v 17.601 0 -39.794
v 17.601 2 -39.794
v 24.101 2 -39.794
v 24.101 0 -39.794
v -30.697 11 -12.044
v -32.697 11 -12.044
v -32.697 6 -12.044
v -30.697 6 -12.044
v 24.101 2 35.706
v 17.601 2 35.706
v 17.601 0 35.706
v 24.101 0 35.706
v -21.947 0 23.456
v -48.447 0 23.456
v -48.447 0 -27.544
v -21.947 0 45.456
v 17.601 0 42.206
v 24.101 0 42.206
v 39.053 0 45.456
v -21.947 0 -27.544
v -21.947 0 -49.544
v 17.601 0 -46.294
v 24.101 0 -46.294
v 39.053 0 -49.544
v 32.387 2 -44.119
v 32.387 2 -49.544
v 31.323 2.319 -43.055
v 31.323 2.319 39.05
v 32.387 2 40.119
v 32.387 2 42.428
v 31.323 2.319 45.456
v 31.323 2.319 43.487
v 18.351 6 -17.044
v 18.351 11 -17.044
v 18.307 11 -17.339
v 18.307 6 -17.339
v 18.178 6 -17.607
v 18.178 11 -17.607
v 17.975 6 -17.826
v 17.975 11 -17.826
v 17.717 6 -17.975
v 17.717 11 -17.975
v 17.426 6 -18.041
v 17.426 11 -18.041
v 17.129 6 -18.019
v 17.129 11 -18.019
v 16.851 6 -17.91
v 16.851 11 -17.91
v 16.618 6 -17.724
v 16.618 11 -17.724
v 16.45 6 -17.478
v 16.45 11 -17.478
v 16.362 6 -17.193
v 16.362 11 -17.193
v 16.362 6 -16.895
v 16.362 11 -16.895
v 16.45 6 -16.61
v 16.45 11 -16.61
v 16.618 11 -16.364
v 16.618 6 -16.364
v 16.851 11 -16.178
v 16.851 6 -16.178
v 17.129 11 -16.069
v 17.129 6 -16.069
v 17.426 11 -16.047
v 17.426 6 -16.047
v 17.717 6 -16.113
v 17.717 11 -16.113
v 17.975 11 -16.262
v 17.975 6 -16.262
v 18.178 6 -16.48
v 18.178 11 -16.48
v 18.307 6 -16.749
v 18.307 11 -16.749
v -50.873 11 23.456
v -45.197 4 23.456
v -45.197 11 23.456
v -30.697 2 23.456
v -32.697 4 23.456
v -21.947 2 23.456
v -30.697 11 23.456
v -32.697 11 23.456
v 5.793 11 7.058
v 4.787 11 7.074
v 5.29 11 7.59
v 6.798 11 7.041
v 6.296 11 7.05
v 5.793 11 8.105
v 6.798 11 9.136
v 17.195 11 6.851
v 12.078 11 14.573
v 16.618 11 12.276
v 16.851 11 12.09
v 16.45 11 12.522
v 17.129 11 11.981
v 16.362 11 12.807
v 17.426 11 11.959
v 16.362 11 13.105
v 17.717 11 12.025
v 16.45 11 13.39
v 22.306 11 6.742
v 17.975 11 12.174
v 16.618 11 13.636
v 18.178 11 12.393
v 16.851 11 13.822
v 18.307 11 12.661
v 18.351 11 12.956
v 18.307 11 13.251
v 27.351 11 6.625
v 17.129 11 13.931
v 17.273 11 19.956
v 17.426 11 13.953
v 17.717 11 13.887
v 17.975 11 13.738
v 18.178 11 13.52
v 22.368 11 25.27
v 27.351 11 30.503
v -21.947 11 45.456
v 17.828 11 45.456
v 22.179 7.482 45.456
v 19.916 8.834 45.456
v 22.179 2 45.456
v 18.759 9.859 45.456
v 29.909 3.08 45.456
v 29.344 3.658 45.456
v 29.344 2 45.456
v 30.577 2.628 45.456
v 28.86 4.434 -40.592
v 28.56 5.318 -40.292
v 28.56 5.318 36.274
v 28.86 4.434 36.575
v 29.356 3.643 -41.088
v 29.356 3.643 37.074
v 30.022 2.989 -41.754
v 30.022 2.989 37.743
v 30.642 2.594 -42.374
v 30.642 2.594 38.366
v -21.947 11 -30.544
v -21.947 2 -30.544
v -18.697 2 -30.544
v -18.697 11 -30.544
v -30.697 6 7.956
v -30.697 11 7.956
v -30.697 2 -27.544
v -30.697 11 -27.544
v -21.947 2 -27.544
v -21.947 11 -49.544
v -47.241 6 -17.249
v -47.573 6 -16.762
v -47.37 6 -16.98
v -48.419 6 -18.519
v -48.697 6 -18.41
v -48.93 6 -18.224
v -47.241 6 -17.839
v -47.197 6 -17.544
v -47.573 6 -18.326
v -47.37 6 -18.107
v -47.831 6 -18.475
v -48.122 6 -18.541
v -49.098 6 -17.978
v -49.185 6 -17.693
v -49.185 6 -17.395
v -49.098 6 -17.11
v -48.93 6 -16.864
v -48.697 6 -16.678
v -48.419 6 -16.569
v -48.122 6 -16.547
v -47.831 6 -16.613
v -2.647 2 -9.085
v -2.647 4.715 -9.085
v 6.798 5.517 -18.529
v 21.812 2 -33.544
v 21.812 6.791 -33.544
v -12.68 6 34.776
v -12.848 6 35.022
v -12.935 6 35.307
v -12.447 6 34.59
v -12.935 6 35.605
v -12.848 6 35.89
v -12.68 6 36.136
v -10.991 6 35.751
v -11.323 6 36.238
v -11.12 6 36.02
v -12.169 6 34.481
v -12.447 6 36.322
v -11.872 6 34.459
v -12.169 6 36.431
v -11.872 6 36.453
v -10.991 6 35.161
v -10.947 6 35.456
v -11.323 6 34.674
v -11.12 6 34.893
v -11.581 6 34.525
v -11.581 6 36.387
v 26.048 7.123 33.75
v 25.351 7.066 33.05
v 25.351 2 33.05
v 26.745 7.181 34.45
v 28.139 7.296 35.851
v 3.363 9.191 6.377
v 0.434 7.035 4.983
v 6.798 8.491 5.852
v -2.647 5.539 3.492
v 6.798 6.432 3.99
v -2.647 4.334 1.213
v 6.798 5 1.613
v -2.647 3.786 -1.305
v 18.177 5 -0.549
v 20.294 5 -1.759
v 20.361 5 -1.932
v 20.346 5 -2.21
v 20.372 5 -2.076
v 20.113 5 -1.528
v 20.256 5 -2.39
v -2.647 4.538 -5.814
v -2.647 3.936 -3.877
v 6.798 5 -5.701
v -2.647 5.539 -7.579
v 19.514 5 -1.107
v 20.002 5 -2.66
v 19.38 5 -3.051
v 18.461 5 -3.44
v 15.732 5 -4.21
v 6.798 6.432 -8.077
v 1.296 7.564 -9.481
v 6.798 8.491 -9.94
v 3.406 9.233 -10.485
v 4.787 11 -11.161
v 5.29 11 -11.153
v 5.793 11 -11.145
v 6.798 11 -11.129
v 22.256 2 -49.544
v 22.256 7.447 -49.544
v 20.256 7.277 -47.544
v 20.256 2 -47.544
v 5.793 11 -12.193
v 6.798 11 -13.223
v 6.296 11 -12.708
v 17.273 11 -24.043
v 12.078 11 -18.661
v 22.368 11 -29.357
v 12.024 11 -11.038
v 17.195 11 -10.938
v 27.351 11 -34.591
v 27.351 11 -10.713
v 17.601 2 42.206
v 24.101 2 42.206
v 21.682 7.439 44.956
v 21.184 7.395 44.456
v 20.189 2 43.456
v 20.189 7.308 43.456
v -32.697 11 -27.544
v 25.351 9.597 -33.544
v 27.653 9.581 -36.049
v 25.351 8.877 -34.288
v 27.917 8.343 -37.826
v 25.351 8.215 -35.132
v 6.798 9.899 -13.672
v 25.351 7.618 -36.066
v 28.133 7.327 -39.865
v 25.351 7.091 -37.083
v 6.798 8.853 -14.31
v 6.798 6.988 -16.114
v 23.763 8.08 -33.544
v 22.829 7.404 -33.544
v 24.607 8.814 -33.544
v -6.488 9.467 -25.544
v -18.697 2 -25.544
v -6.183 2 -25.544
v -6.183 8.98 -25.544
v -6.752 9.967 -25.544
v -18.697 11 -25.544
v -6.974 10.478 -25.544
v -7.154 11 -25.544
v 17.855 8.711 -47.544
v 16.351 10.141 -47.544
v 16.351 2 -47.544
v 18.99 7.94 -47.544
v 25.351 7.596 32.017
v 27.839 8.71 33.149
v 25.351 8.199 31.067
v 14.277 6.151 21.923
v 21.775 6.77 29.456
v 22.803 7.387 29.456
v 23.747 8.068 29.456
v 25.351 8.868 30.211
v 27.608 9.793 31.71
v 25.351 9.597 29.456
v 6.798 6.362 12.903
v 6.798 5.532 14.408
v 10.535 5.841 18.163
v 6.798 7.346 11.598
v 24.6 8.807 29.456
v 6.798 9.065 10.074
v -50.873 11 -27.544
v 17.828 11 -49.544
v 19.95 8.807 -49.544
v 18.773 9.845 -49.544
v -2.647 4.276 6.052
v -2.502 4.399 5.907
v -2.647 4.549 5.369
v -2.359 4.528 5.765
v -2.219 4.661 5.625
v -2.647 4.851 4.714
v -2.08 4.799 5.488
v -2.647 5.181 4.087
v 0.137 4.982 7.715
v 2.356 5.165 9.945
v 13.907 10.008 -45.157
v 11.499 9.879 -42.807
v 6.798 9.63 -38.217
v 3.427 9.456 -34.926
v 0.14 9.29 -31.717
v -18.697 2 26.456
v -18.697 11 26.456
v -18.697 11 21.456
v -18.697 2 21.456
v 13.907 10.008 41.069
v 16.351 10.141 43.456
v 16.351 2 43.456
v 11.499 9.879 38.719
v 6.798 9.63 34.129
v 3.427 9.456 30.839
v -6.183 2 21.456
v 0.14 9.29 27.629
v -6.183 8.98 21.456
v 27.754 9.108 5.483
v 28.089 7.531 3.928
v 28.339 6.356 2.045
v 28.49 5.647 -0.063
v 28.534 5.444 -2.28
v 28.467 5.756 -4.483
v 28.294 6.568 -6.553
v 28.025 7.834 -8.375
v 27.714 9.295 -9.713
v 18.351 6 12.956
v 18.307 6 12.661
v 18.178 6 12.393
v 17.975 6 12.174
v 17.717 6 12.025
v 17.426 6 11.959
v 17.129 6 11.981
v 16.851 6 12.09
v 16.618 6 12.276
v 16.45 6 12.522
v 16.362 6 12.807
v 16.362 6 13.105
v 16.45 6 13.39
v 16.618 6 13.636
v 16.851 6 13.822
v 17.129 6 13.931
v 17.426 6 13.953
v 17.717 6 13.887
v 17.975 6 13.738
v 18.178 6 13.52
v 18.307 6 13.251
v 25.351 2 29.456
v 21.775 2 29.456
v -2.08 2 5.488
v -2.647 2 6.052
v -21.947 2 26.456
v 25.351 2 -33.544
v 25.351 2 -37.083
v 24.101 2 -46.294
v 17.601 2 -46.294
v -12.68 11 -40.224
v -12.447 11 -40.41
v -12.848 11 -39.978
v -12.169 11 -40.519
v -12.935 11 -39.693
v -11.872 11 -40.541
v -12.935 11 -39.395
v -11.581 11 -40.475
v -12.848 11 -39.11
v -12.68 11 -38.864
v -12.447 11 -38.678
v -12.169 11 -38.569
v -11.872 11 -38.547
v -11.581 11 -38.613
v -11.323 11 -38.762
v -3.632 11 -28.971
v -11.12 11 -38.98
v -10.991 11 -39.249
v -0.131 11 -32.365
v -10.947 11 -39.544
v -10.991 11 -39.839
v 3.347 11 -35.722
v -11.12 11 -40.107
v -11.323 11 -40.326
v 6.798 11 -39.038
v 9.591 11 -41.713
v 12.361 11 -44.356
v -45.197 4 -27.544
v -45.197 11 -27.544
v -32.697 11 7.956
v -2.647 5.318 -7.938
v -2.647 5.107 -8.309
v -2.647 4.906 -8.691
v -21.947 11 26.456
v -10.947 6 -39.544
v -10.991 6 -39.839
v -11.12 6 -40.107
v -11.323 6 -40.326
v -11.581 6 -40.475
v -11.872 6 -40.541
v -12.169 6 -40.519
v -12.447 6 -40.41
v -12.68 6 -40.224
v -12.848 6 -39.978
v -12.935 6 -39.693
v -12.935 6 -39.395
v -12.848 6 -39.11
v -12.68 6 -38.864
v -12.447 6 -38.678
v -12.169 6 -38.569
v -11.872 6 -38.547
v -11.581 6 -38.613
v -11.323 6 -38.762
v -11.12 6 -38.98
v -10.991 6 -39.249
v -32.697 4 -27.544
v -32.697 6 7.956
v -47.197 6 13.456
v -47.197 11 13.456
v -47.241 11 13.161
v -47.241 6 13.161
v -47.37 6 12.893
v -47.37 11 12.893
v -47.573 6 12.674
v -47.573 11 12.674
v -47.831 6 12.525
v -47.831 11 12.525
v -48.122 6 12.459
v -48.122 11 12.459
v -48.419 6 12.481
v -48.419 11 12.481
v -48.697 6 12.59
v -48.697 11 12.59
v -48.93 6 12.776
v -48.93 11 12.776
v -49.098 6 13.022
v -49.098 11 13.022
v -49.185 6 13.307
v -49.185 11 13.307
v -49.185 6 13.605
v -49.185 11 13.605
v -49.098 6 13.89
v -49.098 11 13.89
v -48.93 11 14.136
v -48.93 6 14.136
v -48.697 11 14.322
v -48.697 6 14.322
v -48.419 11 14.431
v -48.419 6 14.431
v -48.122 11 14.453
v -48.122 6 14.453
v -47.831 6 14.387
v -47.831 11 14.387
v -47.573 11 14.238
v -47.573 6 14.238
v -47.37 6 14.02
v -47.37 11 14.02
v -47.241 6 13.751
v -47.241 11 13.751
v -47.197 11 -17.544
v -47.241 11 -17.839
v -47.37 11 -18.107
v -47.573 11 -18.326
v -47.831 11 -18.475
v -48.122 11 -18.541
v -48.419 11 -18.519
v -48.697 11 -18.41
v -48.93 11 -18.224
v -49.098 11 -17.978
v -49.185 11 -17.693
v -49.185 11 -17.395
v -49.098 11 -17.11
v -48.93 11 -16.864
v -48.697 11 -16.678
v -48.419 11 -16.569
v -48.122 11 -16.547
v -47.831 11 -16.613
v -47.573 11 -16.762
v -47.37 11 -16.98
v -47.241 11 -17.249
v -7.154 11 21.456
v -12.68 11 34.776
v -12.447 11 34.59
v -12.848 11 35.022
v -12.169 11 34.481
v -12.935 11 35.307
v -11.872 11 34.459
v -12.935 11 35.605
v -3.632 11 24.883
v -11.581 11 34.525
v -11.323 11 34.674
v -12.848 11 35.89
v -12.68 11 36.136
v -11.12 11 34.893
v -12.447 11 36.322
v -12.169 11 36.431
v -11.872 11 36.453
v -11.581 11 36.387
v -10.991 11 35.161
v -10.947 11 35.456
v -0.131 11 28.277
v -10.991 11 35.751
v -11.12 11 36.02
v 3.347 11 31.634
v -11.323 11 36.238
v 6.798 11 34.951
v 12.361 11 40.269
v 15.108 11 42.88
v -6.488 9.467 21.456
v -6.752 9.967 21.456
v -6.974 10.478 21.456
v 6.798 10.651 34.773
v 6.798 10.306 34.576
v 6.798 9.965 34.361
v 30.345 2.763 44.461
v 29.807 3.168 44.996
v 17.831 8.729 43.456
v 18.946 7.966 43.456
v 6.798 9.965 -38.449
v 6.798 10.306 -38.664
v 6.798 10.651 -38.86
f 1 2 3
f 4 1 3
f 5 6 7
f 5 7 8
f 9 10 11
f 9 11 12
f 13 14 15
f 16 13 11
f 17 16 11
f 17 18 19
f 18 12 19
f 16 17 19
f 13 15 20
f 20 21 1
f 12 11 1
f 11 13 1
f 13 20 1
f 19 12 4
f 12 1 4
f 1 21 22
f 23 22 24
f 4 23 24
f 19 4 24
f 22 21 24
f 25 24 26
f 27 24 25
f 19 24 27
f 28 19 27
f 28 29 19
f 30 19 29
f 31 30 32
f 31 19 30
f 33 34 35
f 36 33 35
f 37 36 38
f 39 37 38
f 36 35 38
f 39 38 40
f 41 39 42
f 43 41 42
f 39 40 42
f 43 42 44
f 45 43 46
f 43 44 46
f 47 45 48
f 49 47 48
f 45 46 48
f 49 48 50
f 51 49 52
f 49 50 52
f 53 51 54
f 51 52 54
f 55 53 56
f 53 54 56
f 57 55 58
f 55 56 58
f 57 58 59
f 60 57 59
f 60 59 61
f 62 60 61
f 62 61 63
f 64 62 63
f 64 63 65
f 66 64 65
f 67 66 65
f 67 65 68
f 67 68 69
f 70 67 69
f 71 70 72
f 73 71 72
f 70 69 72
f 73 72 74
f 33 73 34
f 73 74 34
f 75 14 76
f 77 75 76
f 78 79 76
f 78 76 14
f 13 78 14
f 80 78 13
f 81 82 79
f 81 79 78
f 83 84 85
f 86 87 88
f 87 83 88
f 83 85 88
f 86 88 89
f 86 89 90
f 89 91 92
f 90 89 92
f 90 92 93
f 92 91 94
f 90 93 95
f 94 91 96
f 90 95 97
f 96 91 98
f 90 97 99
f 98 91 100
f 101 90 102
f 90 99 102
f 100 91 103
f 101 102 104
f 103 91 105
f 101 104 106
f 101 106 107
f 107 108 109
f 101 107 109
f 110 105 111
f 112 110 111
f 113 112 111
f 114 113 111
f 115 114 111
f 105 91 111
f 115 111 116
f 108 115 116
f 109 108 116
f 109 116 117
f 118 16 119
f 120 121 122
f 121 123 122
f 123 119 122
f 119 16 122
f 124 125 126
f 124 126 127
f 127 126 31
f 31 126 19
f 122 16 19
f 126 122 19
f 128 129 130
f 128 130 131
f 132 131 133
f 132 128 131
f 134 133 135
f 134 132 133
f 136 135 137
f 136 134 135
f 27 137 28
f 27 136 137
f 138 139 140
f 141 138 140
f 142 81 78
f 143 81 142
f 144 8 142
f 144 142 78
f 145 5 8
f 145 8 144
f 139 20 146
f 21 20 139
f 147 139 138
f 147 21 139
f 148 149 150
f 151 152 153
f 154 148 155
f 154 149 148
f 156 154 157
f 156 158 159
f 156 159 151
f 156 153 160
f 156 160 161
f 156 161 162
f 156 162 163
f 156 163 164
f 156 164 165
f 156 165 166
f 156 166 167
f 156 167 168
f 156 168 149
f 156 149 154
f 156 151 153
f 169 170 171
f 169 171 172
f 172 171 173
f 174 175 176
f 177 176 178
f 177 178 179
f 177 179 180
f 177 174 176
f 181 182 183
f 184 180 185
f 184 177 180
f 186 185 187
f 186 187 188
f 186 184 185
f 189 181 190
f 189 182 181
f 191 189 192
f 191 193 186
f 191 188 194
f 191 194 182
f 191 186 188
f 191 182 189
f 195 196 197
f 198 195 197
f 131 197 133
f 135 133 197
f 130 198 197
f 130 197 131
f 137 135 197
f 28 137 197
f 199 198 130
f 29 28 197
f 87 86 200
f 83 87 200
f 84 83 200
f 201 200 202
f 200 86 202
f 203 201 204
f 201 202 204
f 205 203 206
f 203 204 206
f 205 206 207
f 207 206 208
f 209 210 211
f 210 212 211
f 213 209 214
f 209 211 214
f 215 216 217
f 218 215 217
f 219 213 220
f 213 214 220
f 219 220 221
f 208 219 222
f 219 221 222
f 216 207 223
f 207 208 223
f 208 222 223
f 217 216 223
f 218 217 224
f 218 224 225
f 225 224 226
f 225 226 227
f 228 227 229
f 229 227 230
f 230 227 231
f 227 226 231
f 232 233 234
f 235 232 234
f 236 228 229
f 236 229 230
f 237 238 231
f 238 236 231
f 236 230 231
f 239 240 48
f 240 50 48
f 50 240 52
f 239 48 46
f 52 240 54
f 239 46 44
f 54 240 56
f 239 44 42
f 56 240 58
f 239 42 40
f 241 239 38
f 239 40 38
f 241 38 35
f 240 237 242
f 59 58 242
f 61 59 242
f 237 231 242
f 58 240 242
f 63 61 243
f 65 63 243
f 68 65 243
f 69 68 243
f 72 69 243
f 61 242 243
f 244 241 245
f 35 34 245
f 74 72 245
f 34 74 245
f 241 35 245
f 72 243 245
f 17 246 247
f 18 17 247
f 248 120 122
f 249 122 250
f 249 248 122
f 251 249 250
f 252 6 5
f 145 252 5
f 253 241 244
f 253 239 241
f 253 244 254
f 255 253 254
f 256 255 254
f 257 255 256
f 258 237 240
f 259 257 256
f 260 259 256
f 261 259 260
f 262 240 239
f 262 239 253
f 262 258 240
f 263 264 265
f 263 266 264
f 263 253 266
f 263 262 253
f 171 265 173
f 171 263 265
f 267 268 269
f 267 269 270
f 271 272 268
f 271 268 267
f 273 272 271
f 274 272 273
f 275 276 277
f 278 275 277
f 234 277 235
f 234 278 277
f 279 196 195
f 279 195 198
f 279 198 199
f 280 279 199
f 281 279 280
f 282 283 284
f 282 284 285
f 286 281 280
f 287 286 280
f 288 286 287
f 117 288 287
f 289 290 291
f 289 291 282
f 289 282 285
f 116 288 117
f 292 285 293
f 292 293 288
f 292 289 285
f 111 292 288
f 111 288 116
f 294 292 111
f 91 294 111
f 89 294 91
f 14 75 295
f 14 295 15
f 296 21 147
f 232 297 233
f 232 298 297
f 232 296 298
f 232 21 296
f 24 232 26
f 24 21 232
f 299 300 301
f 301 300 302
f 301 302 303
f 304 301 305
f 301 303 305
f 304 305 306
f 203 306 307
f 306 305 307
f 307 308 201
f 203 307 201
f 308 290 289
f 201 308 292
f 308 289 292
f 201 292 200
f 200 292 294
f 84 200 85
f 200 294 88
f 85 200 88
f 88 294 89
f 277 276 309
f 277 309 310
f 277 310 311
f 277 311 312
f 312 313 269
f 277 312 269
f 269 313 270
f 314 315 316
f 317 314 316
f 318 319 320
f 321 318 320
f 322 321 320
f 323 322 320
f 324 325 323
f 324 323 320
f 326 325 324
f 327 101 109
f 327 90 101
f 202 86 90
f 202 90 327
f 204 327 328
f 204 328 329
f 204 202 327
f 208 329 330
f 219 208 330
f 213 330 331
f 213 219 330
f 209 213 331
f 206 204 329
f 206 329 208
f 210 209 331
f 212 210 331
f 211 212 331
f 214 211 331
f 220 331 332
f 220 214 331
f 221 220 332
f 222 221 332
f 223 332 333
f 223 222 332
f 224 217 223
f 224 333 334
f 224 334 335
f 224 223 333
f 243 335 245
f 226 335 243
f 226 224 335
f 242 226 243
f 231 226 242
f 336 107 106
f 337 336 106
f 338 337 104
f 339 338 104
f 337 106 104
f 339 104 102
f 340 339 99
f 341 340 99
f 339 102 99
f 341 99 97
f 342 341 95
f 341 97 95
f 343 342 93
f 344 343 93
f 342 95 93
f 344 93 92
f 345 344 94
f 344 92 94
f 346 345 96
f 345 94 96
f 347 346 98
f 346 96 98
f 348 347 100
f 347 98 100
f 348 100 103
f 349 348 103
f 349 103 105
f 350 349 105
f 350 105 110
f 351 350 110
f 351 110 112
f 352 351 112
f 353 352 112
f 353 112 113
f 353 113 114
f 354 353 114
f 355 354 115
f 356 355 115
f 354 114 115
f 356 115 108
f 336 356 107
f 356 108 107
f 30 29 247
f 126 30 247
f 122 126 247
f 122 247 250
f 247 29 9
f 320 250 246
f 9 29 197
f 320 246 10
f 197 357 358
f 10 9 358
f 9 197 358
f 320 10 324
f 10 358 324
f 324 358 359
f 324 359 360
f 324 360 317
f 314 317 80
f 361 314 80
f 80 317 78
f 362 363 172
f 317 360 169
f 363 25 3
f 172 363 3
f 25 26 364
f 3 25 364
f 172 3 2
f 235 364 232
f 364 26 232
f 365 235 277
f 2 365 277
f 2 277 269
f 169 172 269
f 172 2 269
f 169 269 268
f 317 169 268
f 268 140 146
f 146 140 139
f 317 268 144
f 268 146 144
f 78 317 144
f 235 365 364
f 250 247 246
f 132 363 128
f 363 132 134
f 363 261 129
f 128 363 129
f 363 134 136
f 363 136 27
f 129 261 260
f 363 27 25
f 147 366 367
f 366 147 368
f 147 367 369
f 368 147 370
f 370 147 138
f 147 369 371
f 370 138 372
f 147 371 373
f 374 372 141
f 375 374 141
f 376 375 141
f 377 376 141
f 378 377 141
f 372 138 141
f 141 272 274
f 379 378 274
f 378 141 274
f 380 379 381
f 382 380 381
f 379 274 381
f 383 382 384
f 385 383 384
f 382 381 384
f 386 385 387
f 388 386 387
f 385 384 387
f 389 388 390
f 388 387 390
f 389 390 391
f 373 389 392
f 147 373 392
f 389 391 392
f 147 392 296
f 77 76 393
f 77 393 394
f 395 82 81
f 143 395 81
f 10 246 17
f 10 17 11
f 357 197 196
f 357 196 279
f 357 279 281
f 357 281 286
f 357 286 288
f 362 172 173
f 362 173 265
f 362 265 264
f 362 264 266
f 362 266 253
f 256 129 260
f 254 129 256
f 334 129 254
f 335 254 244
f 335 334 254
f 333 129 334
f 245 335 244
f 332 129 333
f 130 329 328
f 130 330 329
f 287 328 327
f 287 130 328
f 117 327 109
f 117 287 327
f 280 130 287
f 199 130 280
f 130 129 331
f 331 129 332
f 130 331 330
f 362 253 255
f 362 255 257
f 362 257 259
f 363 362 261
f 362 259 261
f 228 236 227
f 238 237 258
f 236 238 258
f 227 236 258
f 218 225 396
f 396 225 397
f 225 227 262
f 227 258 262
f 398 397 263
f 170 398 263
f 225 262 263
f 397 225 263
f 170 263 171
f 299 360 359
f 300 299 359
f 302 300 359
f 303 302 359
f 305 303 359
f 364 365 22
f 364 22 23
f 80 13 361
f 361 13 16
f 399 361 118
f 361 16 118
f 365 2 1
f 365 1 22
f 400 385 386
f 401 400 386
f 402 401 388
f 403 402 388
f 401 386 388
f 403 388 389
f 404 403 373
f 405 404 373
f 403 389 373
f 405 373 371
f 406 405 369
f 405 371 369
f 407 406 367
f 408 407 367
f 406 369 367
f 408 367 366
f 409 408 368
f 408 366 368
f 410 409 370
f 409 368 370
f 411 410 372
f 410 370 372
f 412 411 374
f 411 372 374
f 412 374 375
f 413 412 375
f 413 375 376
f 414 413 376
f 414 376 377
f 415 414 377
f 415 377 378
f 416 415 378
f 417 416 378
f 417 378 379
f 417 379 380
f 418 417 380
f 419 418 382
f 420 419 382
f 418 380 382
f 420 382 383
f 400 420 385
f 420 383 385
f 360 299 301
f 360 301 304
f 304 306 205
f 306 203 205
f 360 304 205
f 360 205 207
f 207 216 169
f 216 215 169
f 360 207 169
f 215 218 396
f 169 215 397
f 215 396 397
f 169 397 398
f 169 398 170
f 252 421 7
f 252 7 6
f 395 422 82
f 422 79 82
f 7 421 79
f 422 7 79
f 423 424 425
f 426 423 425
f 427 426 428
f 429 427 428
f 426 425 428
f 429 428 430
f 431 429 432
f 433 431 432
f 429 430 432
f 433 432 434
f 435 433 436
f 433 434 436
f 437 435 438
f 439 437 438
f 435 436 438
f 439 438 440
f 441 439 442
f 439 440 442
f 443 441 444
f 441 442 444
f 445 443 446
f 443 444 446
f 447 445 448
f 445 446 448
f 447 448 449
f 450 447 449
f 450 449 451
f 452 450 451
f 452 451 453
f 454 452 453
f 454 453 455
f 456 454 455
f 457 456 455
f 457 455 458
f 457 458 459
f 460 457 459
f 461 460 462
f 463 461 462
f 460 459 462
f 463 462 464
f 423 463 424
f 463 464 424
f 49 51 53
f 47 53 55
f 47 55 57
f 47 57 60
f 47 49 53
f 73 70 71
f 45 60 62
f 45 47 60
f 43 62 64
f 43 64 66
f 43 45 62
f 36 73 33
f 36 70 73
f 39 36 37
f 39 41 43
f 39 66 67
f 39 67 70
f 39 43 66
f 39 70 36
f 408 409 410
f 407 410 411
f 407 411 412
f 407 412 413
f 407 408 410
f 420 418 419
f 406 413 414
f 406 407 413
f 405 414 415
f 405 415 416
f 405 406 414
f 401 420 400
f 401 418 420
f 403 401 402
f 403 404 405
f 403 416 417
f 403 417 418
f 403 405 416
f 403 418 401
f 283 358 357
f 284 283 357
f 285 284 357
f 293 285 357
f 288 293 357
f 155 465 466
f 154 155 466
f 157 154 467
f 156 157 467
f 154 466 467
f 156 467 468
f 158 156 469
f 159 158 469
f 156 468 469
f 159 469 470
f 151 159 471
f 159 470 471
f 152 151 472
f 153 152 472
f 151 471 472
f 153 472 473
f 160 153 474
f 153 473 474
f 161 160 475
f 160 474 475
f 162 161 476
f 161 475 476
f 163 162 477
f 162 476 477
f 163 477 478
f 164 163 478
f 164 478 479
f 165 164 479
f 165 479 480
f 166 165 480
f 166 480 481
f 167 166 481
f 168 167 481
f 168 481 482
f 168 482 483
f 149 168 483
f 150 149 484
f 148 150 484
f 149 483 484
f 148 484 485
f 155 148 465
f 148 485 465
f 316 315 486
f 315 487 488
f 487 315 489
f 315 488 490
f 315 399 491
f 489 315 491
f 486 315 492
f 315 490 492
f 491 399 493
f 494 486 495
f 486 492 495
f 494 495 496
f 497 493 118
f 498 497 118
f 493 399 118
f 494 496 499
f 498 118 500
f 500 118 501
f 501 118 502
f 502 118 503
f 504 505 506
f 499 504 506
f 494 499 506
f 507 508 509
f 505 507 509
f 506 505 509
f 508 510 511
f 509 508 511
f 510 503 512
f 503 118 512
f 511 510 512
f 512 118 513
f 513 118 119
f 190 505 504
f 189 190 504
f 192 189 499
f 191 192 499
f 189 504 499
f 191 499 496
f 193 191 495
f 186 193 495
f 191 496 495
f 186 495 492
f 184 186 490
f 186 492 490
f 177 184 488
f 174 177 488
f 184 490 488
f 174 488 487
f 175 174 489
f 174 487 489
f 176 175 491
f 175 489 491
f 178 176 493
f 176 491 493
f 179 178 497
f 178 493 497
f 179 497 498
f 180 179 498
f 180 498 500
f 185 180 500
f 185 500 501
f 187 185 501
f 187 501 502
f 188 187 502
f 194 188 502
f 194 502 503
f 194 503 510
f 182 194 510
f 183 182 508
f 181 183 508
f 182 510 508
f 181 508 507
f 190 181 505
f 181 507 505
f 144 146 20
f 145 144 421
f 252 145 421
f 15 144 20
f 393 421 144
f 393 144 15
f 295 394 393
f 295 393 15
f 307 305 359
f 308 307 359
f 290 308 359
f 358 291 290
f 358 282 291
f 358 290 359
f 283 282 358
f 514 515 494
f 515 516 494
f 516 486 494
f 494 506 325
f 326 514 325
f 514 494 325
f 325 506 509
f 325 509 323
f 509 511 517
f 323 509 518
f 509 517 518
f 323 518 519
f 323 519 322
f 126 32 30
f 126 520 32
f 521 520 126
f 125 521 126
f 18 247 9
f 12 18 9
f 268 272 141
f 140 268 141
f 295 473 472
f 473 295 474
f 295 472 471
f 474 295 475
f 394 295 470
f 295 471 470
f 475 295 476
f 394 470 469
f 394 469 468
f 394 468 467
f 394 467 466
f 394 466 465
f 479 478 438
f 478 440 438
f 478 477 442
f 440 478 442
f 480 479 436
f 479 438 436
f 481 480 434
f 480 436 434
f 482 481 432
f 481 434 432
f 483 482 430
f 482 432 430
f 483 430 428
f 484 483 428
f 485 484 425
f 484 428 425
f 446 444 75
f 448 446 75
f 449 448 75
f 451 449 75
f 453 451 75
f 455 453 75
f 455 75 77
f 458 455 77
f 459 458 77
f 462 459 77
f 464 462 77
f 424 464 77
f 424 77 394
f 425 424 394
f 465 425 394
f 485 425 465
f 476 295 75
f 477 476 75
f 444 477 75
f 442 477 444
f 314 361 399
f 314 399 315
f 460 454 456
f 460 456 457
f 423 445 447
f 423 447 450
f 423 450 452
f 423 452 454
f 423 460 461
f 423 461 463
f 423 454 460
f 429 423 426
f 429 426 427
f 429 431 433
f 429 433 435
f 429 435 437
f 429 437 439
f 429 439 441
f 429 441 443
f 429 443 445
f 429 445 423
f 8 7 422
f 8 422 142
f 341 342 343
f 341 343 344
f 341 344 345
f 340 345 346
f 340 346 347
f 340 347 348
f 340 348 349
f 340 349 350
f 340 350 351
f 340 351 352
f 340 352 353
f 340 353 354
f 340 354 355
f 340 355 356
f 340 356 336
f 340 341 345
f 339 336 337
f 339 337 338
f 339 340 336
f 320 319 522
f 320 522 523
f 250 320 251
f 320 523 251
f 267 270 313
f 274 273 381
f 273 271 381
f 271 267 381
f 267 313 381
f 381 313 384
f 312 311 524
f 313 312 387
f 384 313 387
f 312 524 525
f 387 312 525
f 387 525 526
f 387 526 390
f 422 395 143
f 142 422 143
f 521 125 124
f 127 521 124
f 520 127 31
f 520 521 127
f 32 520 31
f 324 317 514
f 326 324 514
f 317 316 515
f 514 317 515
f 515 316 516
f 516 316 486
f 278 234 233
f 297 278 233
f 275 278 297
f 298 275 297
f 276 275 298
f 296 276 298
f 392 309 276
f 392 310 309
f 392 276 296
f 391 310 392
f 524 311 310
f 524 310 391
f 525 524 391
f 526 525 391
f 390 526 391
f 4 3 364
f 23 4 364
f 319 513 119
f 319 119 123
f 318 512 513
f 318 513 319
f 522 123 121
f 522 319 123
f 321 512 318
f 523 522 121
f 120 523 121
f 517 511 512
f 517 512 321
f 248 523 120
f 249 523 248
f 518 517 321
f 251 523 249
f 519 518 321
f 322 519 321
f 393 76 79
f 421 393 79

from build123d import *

# Parameters (mm, degrees)
SKETCH1_W           = 95
SKETCH1_H           = 95
BOSS_EXTRUDE1_DEPTH = 50
CUT_EXTRUDE1_DEPTH  = 100
SKETCH3_R           = 9.5
CUT_EXTRUDE2_DEPTH  = 45
CUT_EXTRUDE4_DEPTH  = 45
CUT_EXTRUDE5_DEPTH  = 45
CUT_EXTRUDE6_DEPTH  = 45
CUT_EXTRUDE7_DEPTH  = 45
SKETCH9_R           = 9.5
CUT_EXTRUDE9_DEPTH  = 45
SKETCH11_R          = 9.5
CUT_EXTRUDE10_DEPTH = 45
SKETCH12_W          = 31.985759797
SKETCH12_H          = 95
BOSS_EXTRUDE2_DEPTH = 45
CUT_EXTRUDE11_DEPTH = 100
SKETCH14_R          = 9.5
CUT_EXTRUDE12_DEPTH = 100
SKETCH15_R          = 9.5
CUT_EXTRUDE13_DEPTH = 100
SKETCH16_R          = 9.5
CUT_EXTRUDE14_DEPTH = 100
FILLET2_R           = 4
SKETCH17_W          = 34
SKETCH17_H          = 34
CUT_EXTRUDE16_DEPTH = 22
SKETCH19_W          = 34
SKETCH19_H          = 34
CUT_EXTRUDE17_DEPTH = 22
SKETCH20_W          = 12.5
SKETCH20_H          = 16.5
CUT_EXTRUDE18_DEPTH = 60
CUT_EXTRUDE19_DEPTH = 60
CUT_EXTRUDE20_DEPTH = 100
SKETCH23_W          = 96.786059211
SKETCH23_H          = 3
CUT_EXTRUDE21_DEPTH = 1090
CUT_EXTRUDE23_DEPTH = 9
SKETCH26_W          = 101.242795937
SKETCH26_H          = 23.181109139
CUT_EXTRUDE24_DEPTH = 1212
SKETCH27_W          = 9
SKETCH27_H          = 14
CUT_EXTRUDE25_DEPTH = 9
CUT_EXTRUDE30_DEPTH = 9
SKETCH33_W          = 5
SKETCH33_H          = 5
CUT_EXTRUDE31_DEPTH = 9
SKETCH34_W          = 11.575223562
SKETCH34_H          = 33.130685917
CUT_EXTRUDE32_DEPTH = 9
SKETCH35_W          = 15
SKETCH35_H          = 47
CUT_EXTRUDE33_DEPTH = 9
SKETCH36_W          = 1.386035128
SKETCH36_H          = 33.130685917
CUT_EXTRUDE34_DEPTH = 9
SKETCH37_W          = 2
SKETCH37_H          = 20
CUT_EXTRUDE35_DEPTH = 5
SKETCH38_R          = 1
CUT_EXTRUDE36_DEPTH = 5
SKETCH39_R          = 1
CUT_EXTRUDE37_DEPTH = 5
CUT_EXTRUDE39_DEPTH = 9
CUT_EXTRUDE40_DEPTH = 9
CUT_EXTRUDE41_DEPTH = 9
SKETCH44_W          = 6.5
SKETCH44_H          = 6.5
CUT_EXTRUDE42_DEPTH = 9
SKETCH45_W          = 12
SKETCH45_H          = 57
CUT_EXTRUDE44_DEPTH = 9
CUT_EXTRUDE48_DEPTH = 9


with BuildPart() as part:
    # Sketch1 → Boss-Extrude1 (new body)
    with BuildSketch(Plane(origin=(0, 0, 0), x_dir=(1, 0, 0), z_dir=(0, 1, 0))):
        with Locations((-8.446550514, 2.043801884)):
            Rectangle(SKETCH1_W, SKETCH1_H)
    extrude(amount=BOSS_EXTRUDE1_DEPTH)

    # Sketch2 → Cut-Extrude1 (cut)
    with BuildSketch(Plane.XY.offset(45.456198116)):
        Polygon((39.053449486, 0), (36.353449486, 50), (39.053449486, 50), align=None)
    extrude(amount=-CUT_EXTRUDE1_DEPTH, mode=Mode.SUBTRACT)

    # Sketch3 → Cut-Extrude2 (cut)
    with BuildSketch(Plane(origin=(38.939900735, 2.10275464, 0), x_dir=(0, 0, -1), z_dir=(0.998545181, 0.05392144, 0))):
        with Locations((2.043801884, 13.394181776)):
            Circle(SKETCH3_R)
    extrude(amount=-CUT_EXTRUDE2_DEPTH, mode=Mode.SUBTRACT)

    # Sketch5 → Cut-Extrude4 (cut)
    with BuildSketch(Plane(origin=(0, 50, 0), x_dir=(1, 0, 0), z_dir=(0, 1, 0))):
        Polygon((39.053449486, 49.543801884), (39.053449486, 29.543801884), (19.053449486, 49.543801884), align=None)
        Polygon((39.053449486, -45.456198116), (39.053449486, -25.456198116), (19.053449486, -45.456198116), align=None)
    extrude(amount=-CUT_EXTRUDE4_DEPTH, mode=Mode.SUBTRACT)

    # Sketch6 → Cut-Extrude5 (cut)
    with BuildSketch(Plane(origin=(0, 50, 0), x_dir=(1, 0, 0), z_dir=(0, 1, 0))):
        Polygon((19.053449486, -45.456198116), (12.925569587, -39.328318218), (6.797689689, -45.456198116), align=None)
        Polygon((19.053449486, 49.543801884), (12.925569587, 43.415921985), (6.797689689, 49.543801884), align=None)
    extrude(amount=-CUT_EXTRUDE5_DEPTH, mode=Mode.SUBTRACT)

    # Sketch7 → Cut-Extrude6 (cut)
    with BuildSketch(Plane(origin=(-13.201374315, 0, 13.201374315), x_dir=(0.707106781, 0, 0.707106781), z_dir=(-0.707106781, 0, 0.707106781))):
        Polygon((45.615209271, 5), (42.915209271, 50), (45.615209271, 50), align=None)
    extrude(amount=-CUT_EXTRUDE6_DEPTH, mode=Mode.SUBTRACT)

    # Sketch8 → Cut-Extrude7 (cut)
    with BuildSketch(Plane(origin=(-15.245176199, 0, -15.245176199), x_dir=(-0.707106781, 0, 0.707106781), z_dir=(-0.707106781, 0, -0.707106781))):
        Polygon((-48.505581614, 5), (-45.805581614, 50), (-48.505581614, 50), align=None)
    extrude(amount=-CUT_EXTRUDE7_DEPTH, mode=Mode.SUBTRACT)

    # Sketch9 → Cut-Extrude9 (cut)
    with BuildSketch(Plane(origin=(34.386964646, 2.917830706, -34.386964646), x_dir=(-0.708373873, 0.059677836, -0.70331004), z_dir=(0.705837415, 0.059892291, -0.705837415))):
        with Locations((14.526974541, 11.311121921)):
            Circle(SKETCH9_R)
    extrude(amount=-CUT_EXTRUDE9_DEPTH, mode=Mode.SUBTRACT)

    # Sketch11 → Cut-Extrude10 (cut)
    with BuildSketch(Plane(origin=(32.350494057, 2.745030447, 32.350494057), x_dir=(0.70331004, 0.059677836, -0.708373873), z_dir=(0.705837415, 0.059892291, 0.705837415))):
        with Locations((-10.17752107, 12.964151979)):
            Circle(SKETCH11_R)
    extrude(amount=-CUT_EXTRUDE10_DEPTH, mode=Mode.SUBTRACT)

    # Sketch12 → Boss-Extrude2 (add)
    with BuildSketch(Plane(origin=(0, 5, 0), x_dir=(1, 0, 0), z_dir=(0, 1, 0))):
        with Locations((22.790569588, 2.043801884)):
            Rectangle(SKETCH12_W, SKETCH12_H)
    extrude(amount=BOSS_EXTRUDE2_DEPTH)

    # Sketch13 → Cut-Extrude11 (cut)
    with BuildSketch(Plane.XY.offset(45.456198116)):
        Polygon((39.053449486, 0), (29.053449486, 3), (19.053449486, 50), (49.745275601, 50), align=None)
    extrude(amount=-CUT_EXTRUDE11_DEPTH, mode=Mode.SUBTRACT)

    # Sketch14 → Cut-Extrude12 (cut)
    with BuildSketch(Plane(origin=(-5.994632406, -0.32371015, 0), x_dir=(0, 0, -1), z_dir=(0.998545181, 0.05392144, 0))):
        with Locations((2.043801884, 13.394181776)):
            Circle(SKETCH14_R)
    extrude(amount=CUT_EXTRUDE12_DEPTH, mode=Mode.SUBTRACT)

    # Sketch15 → Cut-Extrude13 (cut)
    with BuildSketch(Plane(origin=(0.587810371, 0.049877364, 0.587810371), x_dir=(0.70331004, 0.059677836, -0.708373873), z_dir=(0.705837415, 0.059892291, 0.705837415))):
        with Locations((-10.17752107, 12.964151979)):
            Circle(SKETCH15_R)
    extrude(amount=CUT_EXTRUDE13_DEPTH, mode=Mode.SUBTRACT)

    # Sketch16 → Cut-Extrude14 (cut)
    with BuildSketch(Plane(origin=(2.62428096, 0.222677624, -2.62428096), x_dir=(-0.708373873, 0.059677836, -0.70331004), z_dir=(0.705837415, 0.059892291, -0.705837415))):
        with Locations((14.526974541, 11.311121921)):
            Circle(SKETCH16_R)
    extrude(amount=CUT_EXTRUDE14_DEPTH, mode=Mode.SUBTRACT)

    # Fillet2
    fillet2_edges = [part.edges().sort_by_distance(p)[0] for p in [
        (29.053449486, 3, -2.043801884),
    ]]
    fillet(fillet2_edges, radius=FILLET2_R)

    # Sketch17 → Cut-Extrude16 (cut)
    with BuildSketch(Plane.XY.offset(45.456198116)):
        with Locations((-38.946550514, 17)):
            Rectangle(SKETCH17_W, SKETCH17_H)
    extrude(amount=-CUT_EXTRUDE16_DEPTH, mode=Mode.SUBTRACT)

    # Sketch19 → Cut-Extrude17 (cut)
    with BuildSketch(Plane(origin=(0, 0, -49.543801884), x_dir=(-1, 0, 0), z_dir=(0, 0, -1))):
        with Locations((38.946550514, 17)):
            Rectangle(SKETCH19_W, SKETCH19_H)
    extrude(amount=-CUT_EXTRUDE17_DEPTH, mode=Mode.SUBTRACT)

    # Sketch20 → Cut-Extrude18 (cut)
    with BuildSketch(Plane.XY.offset(23.456198116)):
        with Locations((-38.946550514, 12.25)):
            Rectangle(SKETCH20_W, SKETCH20_H)
    extrude(amount=-CUT_EXTRUDE18_DEPTH, mode=Mode.SUBTRACT)

    # Sketch21 → Cut-Extrude19 (cut)
    with BuildSketch(Plane.XY.offset(23.456198116)):
        Polygon((-55.946550514, 34), (-48.446550514, 0), (-55.946550514, 0), align=None)
    extrude(amount=-CUT_EXTRUDE19_DEPTH, mode=Mode.SUBTRACT)

    # Sketch22 → Cut-Extrude20 (cut)
    with BuildSketch(Plane.XY.offset(45.456198116)):
        Polygon((16.581652311, 14.417739075), (-57.762384818, 14.417739075), (-57.762384818, 55.877932289), (42.054048577, 55.877932289), (42.054048577, 14.417739075), align=None)
    extrude(amount=-CUT_EXTRUDE20_DEPTH, mode=Mode.SUBTRACT)

    # Sketch23 → Cut-Extrude21 (cut)
    with BuildSketch(Plane.XY.offset(45.456198116)):
        with Locations((-3.233904528, 12.917739075)):
            Rectangle(SKETCH23_W, SKETCH23_H)
    extrude(amount=-CUT_EXTRUDE21_DEPTH, mode=Mode.SUBTRACT)

    # Sketch25 → Cut-Extrude23 (cut)
    with BuildSketch(Plane(origin=(0, 11.417739075, 0), x_dir=(1, 0, 0), z_dir=(0, 1, 0))):
        Polygon((-14.310515386, -14.521541075), (-2.735291824, -14.521541075), (-2.735291824, 7.535798958), (-2.735291824, 18.609144842), (-14.310515386, 18.609144842), (-14.310515386, 7.535798958), align=None)
    extrude(amount=-CUT_EXTRUDE23_DEPTH, mode=Mode.SUBTRACT)

    # Sketch26 → Cut-Extrude24 (cut)
    with BuildSketch(Plane.XY.offset(45.456198116)):
        with Locations((-4.489584995, 22.59055457)):
            Rectangle(SKETCH26_W, SKETCH26_H)
    extrude(amount=-CUT_EXTRUDE24_DEPTH, mode=Mode.SUBTRACT)

    # Sketch27 → Cut-Extrude25 (cut)
    with BuildSketch(Plane(origin=(0, 11, 0), x_dir=(1, 0, 0), z_dir=(0, 1, 0))):
        with Locations((20.851321826, -36.456198116)):
            Rectangle(SKETCH27_W, SKETCH27_H)
        with Locations((20.851321826, 40.543801884)):
            Rectangle(SKETCH27_W, SKETCH27_H)
    extrude(amount=-CUT_EXTRUDE25_DEPTH, mode=Mode.SUBTRACT)

    # Sketch32 → Cut-Extrude30 (cut)
    with BuildSketch(Plane(origin=(0, 11, 0), x_dir=(1, 0, 0), z_dir=(0, 1, 0))):
        Polygon((16.351321826, -43.456198116), (-14.310515386, -13.521541075), (-14.310515386, -8.521541075), (16.351321826, -38.456198116), align=None)
        Polygon((16.351321826, 47.543801884), (-14.310515386, 17.609144842), (-14.310515386, 12.609144842), (16.351321826, 42.543801884), align=None)
    extrude(amount=-CUT_EXTRUDE30_DEPTH, mode=Mode.SUBTRACT)

    # Sketch33 → Cut-Extrude31 (cut)
    with BuildSketch(Plane(origin=(0, 2, 0), x_dir=(1, 0, 0), z_dir=(0, 1, 0))):
        with Locations((20.851321826, -38.956198116)):
            Rectangle(SKETCH33_W, SKETCH33_H)
        with Locations((20.851321826, 43.043801884)):
            Rectangle(SKETCH33_W, SKETCH33_H)
    extrude(amount=-CUT_EXTRUDE31_DEPTH, mode=Mode.SUBTRACT)

    # Sketch34 → Cut-Extrude32 (cut)
    with BuildSketch(Plane(origin=(0, 11, 0), x_dir=(1, 0, 0), z_dir=(0, 1, 0))):
        with Locations((-8.522903605, 2.043801884)):
            Rectangle(SKETCH34_W, SKETCH34_H)
    extrude(amount=-CUT_EXTRUDE32_DEPTH, mode=Mode.SUBTRACT)

    # Sketch35 → Cut-Extrude33 (cut)
    with BuildSketch(Plane(origin=(0, 11, 0), x_dir=(1, 0, 0), z_dir=(0, 1, 0))):
        with Locations((-23.196550514, 2.043801884)):
            Rectangle(SKETCH35_W, SKETCH35_H)
    extrude(amount=-CUT_EXTRUDE33_DEPTH, mode=Mode.SUBTRACT)

    # Sketch36 → Cut-Extrude34 (cut)
    with BuildSketch(Plane(origin=(0, 11, 0), x_dir=(1, 0, 0), z_dir=(0, 1, 0))):
        with Locations((-15.00353295, 2.043801884)):
            Rectangle(SKETCH36_W, SKETCH36_H)
    extrude(amount=-CUT_EXTRUDE34_DEPTH, mode=Mode.SUBTRACT)

    # Sketch37 → Cut-Extrude35 (cut)
    with BuildSketch(Plane(origin=(0, 11, 0), x_dir=(1, 0, 0), z_dir=(0, 1, 0))):
        with Locations((-31.696550514, 2.043801884)):
            Rectangle(SKETCH37_W, SKETCH37_H)
    extrude(amount=-CUT_EXTRUDE35_DEPTH, mode=Mode.SUBTRACT)

    # Sketch38 → Cut-Extrude36 (cut)
    with BuildSketch(Plane(origin=(0, 11, 0), x_dir=(1, 0, 0), z_dir=(0, 1, 0))):
        with Locations((-11.946550514, 39.543801884)):
            Circle(SKETCH38_R)
        with Locations((-11.946550514, -35.456198116)):
            Circle(SKETCH38_R)
        with Locations((17.351321826, 17.043801884)):
            Circle(SKETCH38_R)
        with Locations((17.351321826, -12.956198116)):
            Circle(SKETCH38_R)
    extrude(amount=-CUT_EXTRUDE36_DEPTH, mode=Mode.SUBTRACT)

    # Sketch39 → Cut-Extrude37 (cut)
    with BuildSketch(Plane(origin=(0, 11, 0), x_dir=(1, 0, 0), z_dir=(0, 1, 0))):
        with Locations((-48.196550514, 17.543801884)):
            Circle(SKETCH39_R)
        with Locations((-48.196550514, -13.456198116)):
            Circle(SKETCH39_R)
    extrude(amount=-CUT_EXTRUDE37_DEPTH, mode=Mode.SUBTRACT)

    # Sketch40 → Cut-Extrude39 (cut)
    with BuildSketch(Plane(origin=(0, 11, 0), x_dir=(1, 0, 0), z_dir=(0, 1, 0))):
        Polygon((-15.696550514, 25.543801884), (-2.647181323, 25.543801884), (-2.647181323, -14.269220545), (-2.647181323, -21.456198116), (-15.696550514, -21.456198116), (-15.696550514, -14.269220545), align=None)
    extrude(amount=-CUT_EXTRUDE39_DEPTH, mode=Mode.SUBTRACT)

    # Sketch41 → Cut-Extrude40 (cut)
    with BuildSketch(Plane(origin=(0, 11, 0), x_dir=(1, 0, 0), z_dir=(0, 1, 0))):
        Polygon((16.351321826, 47.543801884), (16.351321826, 40.043801884), (-2.647181323, 21.729242393), (-4.185964744, 23.325490541), align=None)
    extrude(amount=-CUT_EXTRUDE40_DEPTH, mode=Mode.SUBTRACT)

    # Sketch42 → Cut-Extrude41 (cut)
    with BuildSketch(Plane(origin=(0, 11, 0), x_dir=(1, 0, 0), z_dir=(0, 1, 0))):
        Polygon((16.351321826, -43.456198116), (16.351321826, -35.956198116), (-5.334126199, -15.137389867), (-2.787014943, -23.075510057), align=None)
    extrude(amount=-CUT_EXTRUDE41_DEPTH, mode=Mode.SUBTRACT)

    # Sketch44 → Cut-Extrude42 (cut)
    with BuildSketch(Plane(origin=(0, 2, 0), x_dir=(1, 0, 0), z_dir=(0, 1, 0))):
        with Locations((20.851321826, -38.956198116)):
            Rectangle(SKETCH44_W, SKETCH44_H)
        with Locations((20.851321826, 43.043801884)):
            Rectangle(SKETCH44_W, SKETCH44_H)
    extrude(amount=-CUT_EXTRUDE42_DEPTH, mode=Mode.SUBTRACT)

    # Sketch45 → Cut-Extrude44 (cut)
    with BuildSketch(Plane(origin=(0, 11, 0), x_dir=(1, 0, 0), z_dir=(0, 1, 0))):
        with Locations((-24.696550514, 2.043801884)):
            Rectangle(SKETCH45_W, SKETCH45_H)
    extrude(amount=-CUT_EXTRUDE44_DEPTH, mode=Mode.SUBTRACT)

    # Sketch46 → Cut-Extrude48 (cut)
    with BuildSketch(Plane(origin=(0, 11, 0), x_dir=(1, 0, 0), z_dir=(0, 1, 0))):
        Polygon((-9.876963351, -13.247386672), (-2.080342795, -5.487701891), (33.541472148, -41.279075183), (25.744851592, -49.038759964), align=None)
        Polygon((-4.377362605, 22.910744569), (34.655680256, 61.94378743), (42.433854849, 54.165612837), (0.791196724, 12.522954712), (-6.986977869, 4.744780119), (-6.986977869, 20.301129305), align=None)
    extrude(amount=-CUT_EXTRUDE48_DEPTH, mode=Mode.SUBTRACT)


solid = part.part
